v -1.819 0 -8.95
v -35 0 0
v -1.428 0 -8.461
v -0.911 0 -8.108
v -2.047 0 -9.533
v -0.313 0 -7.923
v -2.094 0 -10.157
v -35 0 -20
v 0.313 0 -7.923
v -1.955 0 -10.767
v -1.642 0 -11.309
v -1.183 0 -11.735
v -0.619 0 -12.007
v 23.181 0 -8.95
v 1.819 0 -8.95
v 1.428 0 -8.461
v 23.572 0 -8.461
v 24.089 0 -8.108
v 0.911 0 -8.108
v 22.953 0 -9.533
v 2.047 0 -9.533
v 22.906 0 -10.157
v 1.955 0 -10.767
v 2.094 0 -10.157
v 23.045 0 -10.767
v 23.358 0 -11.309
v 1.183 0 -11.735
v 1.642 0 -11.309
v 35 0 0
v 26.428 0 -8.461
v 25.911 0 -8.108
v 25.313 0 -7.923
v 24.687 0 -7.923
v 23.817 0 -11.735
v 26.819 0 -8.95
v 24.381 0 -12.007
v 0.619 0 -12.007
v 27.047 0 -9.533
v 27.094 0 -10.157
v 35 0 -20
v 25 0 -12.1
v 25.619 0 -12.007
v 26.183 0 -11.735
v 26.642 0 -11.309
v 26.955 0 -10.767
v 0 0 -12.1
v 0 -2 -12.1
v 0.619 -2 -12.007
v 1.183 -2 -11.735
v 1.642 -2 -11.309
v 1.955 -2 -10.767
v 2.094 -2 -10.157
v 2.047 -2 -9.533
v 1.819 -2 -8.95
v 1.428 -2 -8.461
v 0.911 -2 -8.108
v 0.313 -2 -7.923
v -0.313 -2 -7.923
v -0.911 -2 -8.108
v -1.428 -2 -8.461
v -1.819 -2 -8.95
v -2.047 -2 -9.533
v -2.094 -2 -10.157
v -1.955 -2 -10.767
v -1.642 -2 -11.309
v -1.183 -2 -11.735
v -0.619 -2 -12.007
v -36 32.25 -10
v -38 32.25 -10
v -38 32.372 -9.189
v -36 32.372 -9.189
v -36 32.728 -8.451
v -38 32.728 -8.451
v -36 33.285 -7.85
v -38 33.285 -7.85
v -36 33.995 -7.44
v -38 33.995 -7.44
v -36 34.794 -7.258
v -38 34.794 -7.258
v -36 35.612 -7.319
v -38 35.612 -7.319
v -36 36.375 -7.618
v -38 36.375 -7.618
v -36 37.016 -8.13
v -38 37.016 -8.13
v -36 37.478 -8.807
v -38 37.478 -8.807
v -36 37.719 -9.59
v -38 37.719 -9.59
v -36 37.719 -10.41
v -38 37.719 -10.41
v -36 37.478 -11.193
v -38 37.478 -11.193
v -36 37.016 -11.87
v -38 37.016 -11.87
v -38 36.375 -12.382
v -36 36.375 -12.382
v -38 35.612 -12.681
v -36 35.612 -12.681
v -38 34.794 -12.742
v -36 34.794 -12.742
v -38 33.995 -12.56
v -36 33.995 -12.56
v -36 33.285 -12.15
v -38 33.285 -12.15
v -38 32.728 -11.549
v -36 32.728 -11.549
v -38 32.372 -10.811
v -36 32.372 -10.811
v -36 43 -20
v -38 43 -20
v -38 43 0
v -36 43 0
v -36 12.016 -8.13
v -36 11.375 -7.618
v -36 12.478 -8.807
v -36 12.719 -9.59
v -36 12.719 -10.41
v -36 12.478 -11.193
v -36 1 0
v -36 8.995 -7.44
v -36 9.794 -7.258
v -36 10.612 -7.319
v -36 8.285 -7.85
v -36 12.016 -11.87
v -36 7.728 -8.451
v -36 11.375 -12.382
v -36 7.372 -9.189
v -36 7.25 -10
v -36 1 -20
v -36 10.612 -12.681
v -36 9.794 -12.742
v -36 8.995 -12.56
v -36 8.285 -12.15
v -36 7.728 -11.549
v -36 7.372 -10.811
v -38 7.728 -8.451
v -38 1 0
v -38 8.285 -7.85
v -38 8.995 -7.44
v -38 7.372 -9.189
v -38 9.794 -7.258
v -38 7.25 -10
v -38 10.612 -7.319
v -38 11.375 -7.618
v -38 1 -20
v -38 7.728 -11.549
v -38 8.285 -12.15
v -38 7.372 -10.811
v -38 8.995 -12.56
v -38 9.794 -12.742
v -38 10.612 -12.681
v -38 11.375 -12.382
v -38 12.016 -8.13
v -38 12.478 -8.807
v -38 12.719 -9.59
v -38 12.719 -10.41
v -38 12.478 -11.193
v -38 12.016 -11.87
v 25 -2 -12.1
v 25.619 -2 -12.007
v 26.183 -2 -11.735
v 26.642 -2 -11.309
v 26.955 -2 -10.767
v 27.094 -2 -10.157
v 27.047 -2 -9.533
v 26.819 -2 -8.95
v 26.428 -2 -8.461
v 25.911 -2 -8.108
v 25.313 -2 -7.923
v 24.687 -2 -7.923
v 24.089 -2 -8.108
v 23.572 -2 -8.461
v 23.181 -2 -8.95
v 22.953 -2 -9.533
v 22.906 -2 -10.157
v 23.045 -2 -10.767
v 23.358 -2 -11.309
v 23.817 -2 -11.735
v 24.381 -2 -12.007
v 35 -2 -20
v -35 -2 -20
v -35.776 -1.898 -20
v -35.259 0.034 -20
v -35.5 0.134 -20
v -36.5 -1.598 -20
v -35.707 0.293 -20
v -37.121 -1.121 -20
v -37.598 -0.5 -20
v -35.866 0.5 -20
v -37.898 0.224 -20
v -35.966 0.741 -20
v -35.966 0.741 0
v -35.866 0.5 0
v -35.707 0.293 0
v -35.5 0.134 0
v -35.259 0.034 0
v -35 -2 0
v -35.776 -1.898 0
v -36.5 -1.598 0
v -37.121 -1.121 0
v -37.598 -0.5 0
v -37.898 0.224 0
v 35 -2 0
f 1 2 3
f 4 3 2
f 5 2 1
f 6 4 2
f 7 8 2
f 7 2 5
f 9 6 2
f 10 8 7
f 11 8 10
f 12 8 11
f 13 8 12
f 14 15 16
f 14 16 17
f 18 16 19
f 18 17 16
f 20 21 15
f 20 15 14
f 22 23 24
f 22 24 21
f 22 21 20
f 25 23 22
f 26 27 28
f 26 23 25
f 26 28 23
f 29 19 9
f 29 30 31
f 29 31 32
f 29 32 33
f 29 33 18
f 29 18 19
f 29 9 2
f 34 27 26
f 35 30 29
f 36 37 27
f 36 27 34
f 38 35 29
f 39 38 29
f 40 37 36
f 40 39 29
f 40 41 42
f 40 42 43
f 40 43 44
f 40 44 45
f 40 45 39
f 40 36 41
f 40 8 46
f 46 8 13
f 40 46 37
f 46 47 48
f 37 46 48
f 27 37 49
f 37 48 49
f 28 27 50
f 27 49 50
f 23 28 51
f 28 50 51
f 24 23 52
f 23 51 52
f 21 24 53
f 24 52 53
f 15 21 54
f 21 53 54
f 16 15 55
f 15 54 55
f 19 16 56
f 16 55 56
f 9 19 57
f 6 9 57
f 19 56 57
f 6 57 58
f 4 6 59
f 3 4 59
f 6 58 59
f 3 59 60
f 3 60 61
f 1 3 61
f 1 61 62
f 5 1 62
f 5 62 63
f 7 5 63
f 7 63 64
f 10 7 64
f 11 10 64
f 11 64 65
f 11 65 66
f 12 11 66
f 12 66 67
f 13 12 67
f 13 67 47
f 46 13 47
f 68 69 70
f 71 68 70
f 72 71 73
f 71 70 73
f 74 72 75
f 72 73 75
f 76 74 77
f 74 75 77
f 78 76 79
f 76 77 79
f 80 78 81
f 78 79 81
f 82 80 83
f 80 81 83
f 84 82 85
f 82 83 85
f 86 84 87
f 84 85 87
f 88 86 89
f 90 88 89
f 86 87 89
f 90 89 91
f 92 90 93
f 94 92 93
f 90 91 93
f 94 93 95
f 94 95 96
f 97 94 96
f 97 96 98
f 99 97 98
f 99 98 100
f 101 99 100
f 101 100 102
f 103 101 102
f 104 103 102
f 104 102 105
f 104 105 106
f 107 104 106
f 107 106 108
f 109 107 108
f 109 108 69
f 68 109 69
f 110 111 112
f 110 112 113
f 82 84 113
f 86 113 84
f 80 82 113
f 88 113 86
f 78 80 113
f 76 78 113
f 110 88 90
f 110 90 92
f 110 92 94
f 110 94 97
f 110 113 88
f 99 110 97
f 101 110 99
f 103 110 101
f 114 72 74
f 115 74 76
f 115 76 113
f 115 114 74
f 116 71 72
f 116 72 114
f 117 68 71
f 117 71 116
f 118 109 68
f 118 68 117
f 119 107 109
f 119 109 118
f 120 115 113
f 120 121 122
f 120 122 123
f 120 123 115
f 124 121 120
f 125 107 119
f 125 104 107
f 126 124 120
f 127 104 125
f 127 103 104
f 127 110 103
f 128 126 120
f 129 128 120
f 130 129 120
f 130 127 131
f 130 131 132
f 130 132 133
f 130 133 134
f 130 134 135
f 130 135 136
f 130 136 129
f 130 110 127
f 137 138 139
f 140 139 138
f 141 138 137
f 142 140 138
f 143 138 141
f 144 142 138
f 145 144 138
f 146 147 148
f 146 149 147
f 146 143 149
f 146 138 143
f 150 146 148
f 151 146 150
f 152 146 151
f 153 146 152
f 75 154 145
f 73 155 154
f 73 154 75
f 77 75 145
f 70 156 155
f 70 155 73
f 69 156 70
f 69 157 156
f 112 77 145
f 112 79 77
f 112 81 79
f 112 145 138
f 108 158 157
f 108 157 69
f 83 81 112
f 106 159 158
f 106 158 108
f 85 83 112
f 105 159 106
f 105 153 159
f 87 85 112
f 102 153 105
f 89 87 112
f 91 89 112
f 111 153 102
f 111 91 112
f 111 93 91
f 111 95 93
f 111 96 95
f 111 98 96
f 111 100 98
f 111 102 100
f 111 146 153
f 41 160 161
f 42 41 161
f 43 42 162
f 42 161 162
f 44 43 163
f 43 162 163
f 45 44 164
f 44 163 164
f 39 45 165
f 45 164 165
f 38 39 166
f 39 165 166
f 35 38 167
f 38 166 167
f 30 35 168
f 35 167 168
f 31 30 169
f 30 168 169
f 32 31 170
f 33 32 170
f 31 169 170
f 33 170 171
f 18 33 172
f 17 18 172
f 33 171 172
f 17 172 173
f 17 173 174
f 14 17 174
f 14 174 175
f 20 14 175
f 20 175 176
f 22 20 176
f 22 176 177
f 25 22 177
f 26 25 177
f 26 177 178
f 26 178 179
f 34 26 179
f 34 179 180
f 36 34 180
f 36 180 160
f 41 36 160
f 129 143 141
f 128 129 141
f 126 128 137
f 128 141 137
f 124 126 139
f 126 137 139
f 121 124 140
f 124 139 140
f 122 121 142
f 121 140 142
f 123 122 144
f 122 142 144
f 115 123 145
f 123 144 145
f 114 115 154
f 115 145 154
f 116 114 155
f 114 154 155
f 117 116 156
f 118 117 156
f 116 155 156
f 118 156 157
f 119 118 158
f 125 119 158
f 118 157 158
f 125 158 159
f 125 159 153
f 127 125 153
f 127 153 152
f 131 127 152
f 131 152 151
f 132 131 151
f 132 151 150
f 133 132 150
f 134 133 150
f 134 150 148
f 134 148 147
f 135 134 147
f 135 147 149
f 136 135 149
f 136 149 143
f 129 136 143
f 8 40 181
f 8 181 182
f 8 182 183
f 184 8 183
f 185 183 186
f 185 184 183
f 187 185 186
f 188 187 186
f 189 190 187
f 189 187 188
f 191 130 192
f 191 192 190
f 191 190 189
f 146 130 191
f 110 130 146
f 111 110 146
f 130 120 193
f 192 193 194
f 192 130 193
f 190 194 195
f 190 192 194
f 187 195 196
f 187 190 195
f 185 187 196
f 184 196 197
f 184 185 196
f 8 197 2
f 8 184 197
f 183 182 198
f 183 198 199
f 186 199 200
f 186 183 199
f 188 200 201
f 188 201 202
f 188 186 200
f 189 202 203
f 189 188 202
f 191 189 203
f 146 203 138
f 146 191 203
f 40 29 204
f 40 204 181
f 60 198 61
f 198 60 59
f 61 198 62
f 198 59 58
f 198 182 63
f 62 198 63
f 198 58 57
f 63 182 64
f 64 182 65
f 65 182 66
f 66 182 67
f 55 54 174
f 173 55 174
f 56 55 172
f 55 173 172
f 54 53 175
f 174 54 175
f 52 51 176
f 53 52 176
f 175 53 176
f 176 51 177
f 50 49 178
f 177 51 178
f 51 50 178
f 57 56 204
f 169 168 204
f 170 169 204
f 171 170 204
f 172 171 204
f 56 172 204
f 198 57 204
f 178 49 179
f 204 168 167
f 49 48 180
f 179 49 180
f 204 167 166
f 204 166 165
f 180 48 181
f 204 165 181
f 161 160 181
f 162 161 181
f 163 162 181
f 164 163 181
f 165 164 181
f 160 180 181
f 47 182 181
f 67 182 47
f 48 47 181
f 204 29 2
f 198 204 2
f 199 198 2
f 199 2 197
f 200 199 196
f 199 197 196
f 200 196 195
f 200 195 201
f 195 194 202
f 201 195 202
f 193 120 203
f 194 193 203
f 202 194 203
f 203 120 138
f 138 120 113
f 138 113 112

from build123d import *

# Parameters (mm, degrees)
SKETCH_1_W             = 70
SKETCH_1_H             = 20
SM_BASE_FLANGE_1_DEPTH = 2
SM_EDGE_FLANGE_1_DEPTH = 20
MM_1_D                 = 5.5
MM_1_DEPTH             = 8
MM_1_TIP               = 1.652366702
HOLE_WIZARD_M5_1_D     = 4.2
HOLE_WIZARD_M5_1_DEPTH = 12.4
HOLE_WIZARD_M5_1_TIP   = 1.2618073


# Sheet-metal steps are written as plain solids
with BuildPart() as part:
    # Sketch 1 → 基体-法兰1 (new body)
    with BuildSketch(Plane(origin=(0, 0, 0), x_dir=(1, 0, 0), z_dir=(0, 1, 0))):
        with Locations((0, 10)):
            Rectangle(SKETCH_1_W, SKETCH_1_H)
    extrude(amount=-SM_BASE_FLANGE_1_DEPTH)

    # 边线-法兰1 section (across the edge) → 边线-法兰1 (add)
    with BuildSketch(Plane(origin=(-36, 0, -20), x_dir=(1, 0, 0), z_dir=(0, 0, 1))):
        with BuildLine():
            Line((-2, 1), (-2, 43))
            Line((-2, 43), (0, 43))
            Line((0, 43), (0, 1))
            ThreePointArc((0, 1), (0.292893219, 0.292893219), (1, 0))
            Line((1, 0), (1, -2))
            ThreePointArc((1, -2), (-1.121320344, -1.121320344), (-2, 1))
        make_face()
    extrude(amount=SM_EDGE_FLANGE_1_DEPTH)

    # 大小mm 暗销孔1
    with Locations(Plane(origin=(-36, 35, -10), x_dir=(0, 1, 0), z_dir=(1, 0, 0))):
        with Locations((0, 0), (-25, 0)):
            Hole(MM_1_D / 2, depth=MM_1_DEPTH)
            with Locations((0, 0, -(MM_1_DEPTH + MM_1_TIP / 2))):  # 118° drill point
                Cone(0, MM_1_D / 2, MM_1_TIP, mode=Mode.SUBTRACT)

    # M5 螺纹孔1
    with Locations(Plane(origin=(0, 0, -10), x_dir=(0, 0, 1), z_dir=(0, 1, 0))):
        with Locations((0, 0), (0, 25), (-27.106002663, 33.534976499)):
            Hole(HOLE_WIZARD_M5_1_D / 2, depth=HOLE_WIZARD_M5_1_DEPTH)
            with Locations((0, 0, -(HOLE_WIZARD_M5_1_DEPTH + HOLE_WIZARD_M5_1_TIP / 2))):  # 118° drill point
                Cone(0, HOLE_WIZARD_M5_1_D / 2, HOLE_WIZARD_M5_1_TIP, mode=Mode.SUBTRACT)


solid = part.part
